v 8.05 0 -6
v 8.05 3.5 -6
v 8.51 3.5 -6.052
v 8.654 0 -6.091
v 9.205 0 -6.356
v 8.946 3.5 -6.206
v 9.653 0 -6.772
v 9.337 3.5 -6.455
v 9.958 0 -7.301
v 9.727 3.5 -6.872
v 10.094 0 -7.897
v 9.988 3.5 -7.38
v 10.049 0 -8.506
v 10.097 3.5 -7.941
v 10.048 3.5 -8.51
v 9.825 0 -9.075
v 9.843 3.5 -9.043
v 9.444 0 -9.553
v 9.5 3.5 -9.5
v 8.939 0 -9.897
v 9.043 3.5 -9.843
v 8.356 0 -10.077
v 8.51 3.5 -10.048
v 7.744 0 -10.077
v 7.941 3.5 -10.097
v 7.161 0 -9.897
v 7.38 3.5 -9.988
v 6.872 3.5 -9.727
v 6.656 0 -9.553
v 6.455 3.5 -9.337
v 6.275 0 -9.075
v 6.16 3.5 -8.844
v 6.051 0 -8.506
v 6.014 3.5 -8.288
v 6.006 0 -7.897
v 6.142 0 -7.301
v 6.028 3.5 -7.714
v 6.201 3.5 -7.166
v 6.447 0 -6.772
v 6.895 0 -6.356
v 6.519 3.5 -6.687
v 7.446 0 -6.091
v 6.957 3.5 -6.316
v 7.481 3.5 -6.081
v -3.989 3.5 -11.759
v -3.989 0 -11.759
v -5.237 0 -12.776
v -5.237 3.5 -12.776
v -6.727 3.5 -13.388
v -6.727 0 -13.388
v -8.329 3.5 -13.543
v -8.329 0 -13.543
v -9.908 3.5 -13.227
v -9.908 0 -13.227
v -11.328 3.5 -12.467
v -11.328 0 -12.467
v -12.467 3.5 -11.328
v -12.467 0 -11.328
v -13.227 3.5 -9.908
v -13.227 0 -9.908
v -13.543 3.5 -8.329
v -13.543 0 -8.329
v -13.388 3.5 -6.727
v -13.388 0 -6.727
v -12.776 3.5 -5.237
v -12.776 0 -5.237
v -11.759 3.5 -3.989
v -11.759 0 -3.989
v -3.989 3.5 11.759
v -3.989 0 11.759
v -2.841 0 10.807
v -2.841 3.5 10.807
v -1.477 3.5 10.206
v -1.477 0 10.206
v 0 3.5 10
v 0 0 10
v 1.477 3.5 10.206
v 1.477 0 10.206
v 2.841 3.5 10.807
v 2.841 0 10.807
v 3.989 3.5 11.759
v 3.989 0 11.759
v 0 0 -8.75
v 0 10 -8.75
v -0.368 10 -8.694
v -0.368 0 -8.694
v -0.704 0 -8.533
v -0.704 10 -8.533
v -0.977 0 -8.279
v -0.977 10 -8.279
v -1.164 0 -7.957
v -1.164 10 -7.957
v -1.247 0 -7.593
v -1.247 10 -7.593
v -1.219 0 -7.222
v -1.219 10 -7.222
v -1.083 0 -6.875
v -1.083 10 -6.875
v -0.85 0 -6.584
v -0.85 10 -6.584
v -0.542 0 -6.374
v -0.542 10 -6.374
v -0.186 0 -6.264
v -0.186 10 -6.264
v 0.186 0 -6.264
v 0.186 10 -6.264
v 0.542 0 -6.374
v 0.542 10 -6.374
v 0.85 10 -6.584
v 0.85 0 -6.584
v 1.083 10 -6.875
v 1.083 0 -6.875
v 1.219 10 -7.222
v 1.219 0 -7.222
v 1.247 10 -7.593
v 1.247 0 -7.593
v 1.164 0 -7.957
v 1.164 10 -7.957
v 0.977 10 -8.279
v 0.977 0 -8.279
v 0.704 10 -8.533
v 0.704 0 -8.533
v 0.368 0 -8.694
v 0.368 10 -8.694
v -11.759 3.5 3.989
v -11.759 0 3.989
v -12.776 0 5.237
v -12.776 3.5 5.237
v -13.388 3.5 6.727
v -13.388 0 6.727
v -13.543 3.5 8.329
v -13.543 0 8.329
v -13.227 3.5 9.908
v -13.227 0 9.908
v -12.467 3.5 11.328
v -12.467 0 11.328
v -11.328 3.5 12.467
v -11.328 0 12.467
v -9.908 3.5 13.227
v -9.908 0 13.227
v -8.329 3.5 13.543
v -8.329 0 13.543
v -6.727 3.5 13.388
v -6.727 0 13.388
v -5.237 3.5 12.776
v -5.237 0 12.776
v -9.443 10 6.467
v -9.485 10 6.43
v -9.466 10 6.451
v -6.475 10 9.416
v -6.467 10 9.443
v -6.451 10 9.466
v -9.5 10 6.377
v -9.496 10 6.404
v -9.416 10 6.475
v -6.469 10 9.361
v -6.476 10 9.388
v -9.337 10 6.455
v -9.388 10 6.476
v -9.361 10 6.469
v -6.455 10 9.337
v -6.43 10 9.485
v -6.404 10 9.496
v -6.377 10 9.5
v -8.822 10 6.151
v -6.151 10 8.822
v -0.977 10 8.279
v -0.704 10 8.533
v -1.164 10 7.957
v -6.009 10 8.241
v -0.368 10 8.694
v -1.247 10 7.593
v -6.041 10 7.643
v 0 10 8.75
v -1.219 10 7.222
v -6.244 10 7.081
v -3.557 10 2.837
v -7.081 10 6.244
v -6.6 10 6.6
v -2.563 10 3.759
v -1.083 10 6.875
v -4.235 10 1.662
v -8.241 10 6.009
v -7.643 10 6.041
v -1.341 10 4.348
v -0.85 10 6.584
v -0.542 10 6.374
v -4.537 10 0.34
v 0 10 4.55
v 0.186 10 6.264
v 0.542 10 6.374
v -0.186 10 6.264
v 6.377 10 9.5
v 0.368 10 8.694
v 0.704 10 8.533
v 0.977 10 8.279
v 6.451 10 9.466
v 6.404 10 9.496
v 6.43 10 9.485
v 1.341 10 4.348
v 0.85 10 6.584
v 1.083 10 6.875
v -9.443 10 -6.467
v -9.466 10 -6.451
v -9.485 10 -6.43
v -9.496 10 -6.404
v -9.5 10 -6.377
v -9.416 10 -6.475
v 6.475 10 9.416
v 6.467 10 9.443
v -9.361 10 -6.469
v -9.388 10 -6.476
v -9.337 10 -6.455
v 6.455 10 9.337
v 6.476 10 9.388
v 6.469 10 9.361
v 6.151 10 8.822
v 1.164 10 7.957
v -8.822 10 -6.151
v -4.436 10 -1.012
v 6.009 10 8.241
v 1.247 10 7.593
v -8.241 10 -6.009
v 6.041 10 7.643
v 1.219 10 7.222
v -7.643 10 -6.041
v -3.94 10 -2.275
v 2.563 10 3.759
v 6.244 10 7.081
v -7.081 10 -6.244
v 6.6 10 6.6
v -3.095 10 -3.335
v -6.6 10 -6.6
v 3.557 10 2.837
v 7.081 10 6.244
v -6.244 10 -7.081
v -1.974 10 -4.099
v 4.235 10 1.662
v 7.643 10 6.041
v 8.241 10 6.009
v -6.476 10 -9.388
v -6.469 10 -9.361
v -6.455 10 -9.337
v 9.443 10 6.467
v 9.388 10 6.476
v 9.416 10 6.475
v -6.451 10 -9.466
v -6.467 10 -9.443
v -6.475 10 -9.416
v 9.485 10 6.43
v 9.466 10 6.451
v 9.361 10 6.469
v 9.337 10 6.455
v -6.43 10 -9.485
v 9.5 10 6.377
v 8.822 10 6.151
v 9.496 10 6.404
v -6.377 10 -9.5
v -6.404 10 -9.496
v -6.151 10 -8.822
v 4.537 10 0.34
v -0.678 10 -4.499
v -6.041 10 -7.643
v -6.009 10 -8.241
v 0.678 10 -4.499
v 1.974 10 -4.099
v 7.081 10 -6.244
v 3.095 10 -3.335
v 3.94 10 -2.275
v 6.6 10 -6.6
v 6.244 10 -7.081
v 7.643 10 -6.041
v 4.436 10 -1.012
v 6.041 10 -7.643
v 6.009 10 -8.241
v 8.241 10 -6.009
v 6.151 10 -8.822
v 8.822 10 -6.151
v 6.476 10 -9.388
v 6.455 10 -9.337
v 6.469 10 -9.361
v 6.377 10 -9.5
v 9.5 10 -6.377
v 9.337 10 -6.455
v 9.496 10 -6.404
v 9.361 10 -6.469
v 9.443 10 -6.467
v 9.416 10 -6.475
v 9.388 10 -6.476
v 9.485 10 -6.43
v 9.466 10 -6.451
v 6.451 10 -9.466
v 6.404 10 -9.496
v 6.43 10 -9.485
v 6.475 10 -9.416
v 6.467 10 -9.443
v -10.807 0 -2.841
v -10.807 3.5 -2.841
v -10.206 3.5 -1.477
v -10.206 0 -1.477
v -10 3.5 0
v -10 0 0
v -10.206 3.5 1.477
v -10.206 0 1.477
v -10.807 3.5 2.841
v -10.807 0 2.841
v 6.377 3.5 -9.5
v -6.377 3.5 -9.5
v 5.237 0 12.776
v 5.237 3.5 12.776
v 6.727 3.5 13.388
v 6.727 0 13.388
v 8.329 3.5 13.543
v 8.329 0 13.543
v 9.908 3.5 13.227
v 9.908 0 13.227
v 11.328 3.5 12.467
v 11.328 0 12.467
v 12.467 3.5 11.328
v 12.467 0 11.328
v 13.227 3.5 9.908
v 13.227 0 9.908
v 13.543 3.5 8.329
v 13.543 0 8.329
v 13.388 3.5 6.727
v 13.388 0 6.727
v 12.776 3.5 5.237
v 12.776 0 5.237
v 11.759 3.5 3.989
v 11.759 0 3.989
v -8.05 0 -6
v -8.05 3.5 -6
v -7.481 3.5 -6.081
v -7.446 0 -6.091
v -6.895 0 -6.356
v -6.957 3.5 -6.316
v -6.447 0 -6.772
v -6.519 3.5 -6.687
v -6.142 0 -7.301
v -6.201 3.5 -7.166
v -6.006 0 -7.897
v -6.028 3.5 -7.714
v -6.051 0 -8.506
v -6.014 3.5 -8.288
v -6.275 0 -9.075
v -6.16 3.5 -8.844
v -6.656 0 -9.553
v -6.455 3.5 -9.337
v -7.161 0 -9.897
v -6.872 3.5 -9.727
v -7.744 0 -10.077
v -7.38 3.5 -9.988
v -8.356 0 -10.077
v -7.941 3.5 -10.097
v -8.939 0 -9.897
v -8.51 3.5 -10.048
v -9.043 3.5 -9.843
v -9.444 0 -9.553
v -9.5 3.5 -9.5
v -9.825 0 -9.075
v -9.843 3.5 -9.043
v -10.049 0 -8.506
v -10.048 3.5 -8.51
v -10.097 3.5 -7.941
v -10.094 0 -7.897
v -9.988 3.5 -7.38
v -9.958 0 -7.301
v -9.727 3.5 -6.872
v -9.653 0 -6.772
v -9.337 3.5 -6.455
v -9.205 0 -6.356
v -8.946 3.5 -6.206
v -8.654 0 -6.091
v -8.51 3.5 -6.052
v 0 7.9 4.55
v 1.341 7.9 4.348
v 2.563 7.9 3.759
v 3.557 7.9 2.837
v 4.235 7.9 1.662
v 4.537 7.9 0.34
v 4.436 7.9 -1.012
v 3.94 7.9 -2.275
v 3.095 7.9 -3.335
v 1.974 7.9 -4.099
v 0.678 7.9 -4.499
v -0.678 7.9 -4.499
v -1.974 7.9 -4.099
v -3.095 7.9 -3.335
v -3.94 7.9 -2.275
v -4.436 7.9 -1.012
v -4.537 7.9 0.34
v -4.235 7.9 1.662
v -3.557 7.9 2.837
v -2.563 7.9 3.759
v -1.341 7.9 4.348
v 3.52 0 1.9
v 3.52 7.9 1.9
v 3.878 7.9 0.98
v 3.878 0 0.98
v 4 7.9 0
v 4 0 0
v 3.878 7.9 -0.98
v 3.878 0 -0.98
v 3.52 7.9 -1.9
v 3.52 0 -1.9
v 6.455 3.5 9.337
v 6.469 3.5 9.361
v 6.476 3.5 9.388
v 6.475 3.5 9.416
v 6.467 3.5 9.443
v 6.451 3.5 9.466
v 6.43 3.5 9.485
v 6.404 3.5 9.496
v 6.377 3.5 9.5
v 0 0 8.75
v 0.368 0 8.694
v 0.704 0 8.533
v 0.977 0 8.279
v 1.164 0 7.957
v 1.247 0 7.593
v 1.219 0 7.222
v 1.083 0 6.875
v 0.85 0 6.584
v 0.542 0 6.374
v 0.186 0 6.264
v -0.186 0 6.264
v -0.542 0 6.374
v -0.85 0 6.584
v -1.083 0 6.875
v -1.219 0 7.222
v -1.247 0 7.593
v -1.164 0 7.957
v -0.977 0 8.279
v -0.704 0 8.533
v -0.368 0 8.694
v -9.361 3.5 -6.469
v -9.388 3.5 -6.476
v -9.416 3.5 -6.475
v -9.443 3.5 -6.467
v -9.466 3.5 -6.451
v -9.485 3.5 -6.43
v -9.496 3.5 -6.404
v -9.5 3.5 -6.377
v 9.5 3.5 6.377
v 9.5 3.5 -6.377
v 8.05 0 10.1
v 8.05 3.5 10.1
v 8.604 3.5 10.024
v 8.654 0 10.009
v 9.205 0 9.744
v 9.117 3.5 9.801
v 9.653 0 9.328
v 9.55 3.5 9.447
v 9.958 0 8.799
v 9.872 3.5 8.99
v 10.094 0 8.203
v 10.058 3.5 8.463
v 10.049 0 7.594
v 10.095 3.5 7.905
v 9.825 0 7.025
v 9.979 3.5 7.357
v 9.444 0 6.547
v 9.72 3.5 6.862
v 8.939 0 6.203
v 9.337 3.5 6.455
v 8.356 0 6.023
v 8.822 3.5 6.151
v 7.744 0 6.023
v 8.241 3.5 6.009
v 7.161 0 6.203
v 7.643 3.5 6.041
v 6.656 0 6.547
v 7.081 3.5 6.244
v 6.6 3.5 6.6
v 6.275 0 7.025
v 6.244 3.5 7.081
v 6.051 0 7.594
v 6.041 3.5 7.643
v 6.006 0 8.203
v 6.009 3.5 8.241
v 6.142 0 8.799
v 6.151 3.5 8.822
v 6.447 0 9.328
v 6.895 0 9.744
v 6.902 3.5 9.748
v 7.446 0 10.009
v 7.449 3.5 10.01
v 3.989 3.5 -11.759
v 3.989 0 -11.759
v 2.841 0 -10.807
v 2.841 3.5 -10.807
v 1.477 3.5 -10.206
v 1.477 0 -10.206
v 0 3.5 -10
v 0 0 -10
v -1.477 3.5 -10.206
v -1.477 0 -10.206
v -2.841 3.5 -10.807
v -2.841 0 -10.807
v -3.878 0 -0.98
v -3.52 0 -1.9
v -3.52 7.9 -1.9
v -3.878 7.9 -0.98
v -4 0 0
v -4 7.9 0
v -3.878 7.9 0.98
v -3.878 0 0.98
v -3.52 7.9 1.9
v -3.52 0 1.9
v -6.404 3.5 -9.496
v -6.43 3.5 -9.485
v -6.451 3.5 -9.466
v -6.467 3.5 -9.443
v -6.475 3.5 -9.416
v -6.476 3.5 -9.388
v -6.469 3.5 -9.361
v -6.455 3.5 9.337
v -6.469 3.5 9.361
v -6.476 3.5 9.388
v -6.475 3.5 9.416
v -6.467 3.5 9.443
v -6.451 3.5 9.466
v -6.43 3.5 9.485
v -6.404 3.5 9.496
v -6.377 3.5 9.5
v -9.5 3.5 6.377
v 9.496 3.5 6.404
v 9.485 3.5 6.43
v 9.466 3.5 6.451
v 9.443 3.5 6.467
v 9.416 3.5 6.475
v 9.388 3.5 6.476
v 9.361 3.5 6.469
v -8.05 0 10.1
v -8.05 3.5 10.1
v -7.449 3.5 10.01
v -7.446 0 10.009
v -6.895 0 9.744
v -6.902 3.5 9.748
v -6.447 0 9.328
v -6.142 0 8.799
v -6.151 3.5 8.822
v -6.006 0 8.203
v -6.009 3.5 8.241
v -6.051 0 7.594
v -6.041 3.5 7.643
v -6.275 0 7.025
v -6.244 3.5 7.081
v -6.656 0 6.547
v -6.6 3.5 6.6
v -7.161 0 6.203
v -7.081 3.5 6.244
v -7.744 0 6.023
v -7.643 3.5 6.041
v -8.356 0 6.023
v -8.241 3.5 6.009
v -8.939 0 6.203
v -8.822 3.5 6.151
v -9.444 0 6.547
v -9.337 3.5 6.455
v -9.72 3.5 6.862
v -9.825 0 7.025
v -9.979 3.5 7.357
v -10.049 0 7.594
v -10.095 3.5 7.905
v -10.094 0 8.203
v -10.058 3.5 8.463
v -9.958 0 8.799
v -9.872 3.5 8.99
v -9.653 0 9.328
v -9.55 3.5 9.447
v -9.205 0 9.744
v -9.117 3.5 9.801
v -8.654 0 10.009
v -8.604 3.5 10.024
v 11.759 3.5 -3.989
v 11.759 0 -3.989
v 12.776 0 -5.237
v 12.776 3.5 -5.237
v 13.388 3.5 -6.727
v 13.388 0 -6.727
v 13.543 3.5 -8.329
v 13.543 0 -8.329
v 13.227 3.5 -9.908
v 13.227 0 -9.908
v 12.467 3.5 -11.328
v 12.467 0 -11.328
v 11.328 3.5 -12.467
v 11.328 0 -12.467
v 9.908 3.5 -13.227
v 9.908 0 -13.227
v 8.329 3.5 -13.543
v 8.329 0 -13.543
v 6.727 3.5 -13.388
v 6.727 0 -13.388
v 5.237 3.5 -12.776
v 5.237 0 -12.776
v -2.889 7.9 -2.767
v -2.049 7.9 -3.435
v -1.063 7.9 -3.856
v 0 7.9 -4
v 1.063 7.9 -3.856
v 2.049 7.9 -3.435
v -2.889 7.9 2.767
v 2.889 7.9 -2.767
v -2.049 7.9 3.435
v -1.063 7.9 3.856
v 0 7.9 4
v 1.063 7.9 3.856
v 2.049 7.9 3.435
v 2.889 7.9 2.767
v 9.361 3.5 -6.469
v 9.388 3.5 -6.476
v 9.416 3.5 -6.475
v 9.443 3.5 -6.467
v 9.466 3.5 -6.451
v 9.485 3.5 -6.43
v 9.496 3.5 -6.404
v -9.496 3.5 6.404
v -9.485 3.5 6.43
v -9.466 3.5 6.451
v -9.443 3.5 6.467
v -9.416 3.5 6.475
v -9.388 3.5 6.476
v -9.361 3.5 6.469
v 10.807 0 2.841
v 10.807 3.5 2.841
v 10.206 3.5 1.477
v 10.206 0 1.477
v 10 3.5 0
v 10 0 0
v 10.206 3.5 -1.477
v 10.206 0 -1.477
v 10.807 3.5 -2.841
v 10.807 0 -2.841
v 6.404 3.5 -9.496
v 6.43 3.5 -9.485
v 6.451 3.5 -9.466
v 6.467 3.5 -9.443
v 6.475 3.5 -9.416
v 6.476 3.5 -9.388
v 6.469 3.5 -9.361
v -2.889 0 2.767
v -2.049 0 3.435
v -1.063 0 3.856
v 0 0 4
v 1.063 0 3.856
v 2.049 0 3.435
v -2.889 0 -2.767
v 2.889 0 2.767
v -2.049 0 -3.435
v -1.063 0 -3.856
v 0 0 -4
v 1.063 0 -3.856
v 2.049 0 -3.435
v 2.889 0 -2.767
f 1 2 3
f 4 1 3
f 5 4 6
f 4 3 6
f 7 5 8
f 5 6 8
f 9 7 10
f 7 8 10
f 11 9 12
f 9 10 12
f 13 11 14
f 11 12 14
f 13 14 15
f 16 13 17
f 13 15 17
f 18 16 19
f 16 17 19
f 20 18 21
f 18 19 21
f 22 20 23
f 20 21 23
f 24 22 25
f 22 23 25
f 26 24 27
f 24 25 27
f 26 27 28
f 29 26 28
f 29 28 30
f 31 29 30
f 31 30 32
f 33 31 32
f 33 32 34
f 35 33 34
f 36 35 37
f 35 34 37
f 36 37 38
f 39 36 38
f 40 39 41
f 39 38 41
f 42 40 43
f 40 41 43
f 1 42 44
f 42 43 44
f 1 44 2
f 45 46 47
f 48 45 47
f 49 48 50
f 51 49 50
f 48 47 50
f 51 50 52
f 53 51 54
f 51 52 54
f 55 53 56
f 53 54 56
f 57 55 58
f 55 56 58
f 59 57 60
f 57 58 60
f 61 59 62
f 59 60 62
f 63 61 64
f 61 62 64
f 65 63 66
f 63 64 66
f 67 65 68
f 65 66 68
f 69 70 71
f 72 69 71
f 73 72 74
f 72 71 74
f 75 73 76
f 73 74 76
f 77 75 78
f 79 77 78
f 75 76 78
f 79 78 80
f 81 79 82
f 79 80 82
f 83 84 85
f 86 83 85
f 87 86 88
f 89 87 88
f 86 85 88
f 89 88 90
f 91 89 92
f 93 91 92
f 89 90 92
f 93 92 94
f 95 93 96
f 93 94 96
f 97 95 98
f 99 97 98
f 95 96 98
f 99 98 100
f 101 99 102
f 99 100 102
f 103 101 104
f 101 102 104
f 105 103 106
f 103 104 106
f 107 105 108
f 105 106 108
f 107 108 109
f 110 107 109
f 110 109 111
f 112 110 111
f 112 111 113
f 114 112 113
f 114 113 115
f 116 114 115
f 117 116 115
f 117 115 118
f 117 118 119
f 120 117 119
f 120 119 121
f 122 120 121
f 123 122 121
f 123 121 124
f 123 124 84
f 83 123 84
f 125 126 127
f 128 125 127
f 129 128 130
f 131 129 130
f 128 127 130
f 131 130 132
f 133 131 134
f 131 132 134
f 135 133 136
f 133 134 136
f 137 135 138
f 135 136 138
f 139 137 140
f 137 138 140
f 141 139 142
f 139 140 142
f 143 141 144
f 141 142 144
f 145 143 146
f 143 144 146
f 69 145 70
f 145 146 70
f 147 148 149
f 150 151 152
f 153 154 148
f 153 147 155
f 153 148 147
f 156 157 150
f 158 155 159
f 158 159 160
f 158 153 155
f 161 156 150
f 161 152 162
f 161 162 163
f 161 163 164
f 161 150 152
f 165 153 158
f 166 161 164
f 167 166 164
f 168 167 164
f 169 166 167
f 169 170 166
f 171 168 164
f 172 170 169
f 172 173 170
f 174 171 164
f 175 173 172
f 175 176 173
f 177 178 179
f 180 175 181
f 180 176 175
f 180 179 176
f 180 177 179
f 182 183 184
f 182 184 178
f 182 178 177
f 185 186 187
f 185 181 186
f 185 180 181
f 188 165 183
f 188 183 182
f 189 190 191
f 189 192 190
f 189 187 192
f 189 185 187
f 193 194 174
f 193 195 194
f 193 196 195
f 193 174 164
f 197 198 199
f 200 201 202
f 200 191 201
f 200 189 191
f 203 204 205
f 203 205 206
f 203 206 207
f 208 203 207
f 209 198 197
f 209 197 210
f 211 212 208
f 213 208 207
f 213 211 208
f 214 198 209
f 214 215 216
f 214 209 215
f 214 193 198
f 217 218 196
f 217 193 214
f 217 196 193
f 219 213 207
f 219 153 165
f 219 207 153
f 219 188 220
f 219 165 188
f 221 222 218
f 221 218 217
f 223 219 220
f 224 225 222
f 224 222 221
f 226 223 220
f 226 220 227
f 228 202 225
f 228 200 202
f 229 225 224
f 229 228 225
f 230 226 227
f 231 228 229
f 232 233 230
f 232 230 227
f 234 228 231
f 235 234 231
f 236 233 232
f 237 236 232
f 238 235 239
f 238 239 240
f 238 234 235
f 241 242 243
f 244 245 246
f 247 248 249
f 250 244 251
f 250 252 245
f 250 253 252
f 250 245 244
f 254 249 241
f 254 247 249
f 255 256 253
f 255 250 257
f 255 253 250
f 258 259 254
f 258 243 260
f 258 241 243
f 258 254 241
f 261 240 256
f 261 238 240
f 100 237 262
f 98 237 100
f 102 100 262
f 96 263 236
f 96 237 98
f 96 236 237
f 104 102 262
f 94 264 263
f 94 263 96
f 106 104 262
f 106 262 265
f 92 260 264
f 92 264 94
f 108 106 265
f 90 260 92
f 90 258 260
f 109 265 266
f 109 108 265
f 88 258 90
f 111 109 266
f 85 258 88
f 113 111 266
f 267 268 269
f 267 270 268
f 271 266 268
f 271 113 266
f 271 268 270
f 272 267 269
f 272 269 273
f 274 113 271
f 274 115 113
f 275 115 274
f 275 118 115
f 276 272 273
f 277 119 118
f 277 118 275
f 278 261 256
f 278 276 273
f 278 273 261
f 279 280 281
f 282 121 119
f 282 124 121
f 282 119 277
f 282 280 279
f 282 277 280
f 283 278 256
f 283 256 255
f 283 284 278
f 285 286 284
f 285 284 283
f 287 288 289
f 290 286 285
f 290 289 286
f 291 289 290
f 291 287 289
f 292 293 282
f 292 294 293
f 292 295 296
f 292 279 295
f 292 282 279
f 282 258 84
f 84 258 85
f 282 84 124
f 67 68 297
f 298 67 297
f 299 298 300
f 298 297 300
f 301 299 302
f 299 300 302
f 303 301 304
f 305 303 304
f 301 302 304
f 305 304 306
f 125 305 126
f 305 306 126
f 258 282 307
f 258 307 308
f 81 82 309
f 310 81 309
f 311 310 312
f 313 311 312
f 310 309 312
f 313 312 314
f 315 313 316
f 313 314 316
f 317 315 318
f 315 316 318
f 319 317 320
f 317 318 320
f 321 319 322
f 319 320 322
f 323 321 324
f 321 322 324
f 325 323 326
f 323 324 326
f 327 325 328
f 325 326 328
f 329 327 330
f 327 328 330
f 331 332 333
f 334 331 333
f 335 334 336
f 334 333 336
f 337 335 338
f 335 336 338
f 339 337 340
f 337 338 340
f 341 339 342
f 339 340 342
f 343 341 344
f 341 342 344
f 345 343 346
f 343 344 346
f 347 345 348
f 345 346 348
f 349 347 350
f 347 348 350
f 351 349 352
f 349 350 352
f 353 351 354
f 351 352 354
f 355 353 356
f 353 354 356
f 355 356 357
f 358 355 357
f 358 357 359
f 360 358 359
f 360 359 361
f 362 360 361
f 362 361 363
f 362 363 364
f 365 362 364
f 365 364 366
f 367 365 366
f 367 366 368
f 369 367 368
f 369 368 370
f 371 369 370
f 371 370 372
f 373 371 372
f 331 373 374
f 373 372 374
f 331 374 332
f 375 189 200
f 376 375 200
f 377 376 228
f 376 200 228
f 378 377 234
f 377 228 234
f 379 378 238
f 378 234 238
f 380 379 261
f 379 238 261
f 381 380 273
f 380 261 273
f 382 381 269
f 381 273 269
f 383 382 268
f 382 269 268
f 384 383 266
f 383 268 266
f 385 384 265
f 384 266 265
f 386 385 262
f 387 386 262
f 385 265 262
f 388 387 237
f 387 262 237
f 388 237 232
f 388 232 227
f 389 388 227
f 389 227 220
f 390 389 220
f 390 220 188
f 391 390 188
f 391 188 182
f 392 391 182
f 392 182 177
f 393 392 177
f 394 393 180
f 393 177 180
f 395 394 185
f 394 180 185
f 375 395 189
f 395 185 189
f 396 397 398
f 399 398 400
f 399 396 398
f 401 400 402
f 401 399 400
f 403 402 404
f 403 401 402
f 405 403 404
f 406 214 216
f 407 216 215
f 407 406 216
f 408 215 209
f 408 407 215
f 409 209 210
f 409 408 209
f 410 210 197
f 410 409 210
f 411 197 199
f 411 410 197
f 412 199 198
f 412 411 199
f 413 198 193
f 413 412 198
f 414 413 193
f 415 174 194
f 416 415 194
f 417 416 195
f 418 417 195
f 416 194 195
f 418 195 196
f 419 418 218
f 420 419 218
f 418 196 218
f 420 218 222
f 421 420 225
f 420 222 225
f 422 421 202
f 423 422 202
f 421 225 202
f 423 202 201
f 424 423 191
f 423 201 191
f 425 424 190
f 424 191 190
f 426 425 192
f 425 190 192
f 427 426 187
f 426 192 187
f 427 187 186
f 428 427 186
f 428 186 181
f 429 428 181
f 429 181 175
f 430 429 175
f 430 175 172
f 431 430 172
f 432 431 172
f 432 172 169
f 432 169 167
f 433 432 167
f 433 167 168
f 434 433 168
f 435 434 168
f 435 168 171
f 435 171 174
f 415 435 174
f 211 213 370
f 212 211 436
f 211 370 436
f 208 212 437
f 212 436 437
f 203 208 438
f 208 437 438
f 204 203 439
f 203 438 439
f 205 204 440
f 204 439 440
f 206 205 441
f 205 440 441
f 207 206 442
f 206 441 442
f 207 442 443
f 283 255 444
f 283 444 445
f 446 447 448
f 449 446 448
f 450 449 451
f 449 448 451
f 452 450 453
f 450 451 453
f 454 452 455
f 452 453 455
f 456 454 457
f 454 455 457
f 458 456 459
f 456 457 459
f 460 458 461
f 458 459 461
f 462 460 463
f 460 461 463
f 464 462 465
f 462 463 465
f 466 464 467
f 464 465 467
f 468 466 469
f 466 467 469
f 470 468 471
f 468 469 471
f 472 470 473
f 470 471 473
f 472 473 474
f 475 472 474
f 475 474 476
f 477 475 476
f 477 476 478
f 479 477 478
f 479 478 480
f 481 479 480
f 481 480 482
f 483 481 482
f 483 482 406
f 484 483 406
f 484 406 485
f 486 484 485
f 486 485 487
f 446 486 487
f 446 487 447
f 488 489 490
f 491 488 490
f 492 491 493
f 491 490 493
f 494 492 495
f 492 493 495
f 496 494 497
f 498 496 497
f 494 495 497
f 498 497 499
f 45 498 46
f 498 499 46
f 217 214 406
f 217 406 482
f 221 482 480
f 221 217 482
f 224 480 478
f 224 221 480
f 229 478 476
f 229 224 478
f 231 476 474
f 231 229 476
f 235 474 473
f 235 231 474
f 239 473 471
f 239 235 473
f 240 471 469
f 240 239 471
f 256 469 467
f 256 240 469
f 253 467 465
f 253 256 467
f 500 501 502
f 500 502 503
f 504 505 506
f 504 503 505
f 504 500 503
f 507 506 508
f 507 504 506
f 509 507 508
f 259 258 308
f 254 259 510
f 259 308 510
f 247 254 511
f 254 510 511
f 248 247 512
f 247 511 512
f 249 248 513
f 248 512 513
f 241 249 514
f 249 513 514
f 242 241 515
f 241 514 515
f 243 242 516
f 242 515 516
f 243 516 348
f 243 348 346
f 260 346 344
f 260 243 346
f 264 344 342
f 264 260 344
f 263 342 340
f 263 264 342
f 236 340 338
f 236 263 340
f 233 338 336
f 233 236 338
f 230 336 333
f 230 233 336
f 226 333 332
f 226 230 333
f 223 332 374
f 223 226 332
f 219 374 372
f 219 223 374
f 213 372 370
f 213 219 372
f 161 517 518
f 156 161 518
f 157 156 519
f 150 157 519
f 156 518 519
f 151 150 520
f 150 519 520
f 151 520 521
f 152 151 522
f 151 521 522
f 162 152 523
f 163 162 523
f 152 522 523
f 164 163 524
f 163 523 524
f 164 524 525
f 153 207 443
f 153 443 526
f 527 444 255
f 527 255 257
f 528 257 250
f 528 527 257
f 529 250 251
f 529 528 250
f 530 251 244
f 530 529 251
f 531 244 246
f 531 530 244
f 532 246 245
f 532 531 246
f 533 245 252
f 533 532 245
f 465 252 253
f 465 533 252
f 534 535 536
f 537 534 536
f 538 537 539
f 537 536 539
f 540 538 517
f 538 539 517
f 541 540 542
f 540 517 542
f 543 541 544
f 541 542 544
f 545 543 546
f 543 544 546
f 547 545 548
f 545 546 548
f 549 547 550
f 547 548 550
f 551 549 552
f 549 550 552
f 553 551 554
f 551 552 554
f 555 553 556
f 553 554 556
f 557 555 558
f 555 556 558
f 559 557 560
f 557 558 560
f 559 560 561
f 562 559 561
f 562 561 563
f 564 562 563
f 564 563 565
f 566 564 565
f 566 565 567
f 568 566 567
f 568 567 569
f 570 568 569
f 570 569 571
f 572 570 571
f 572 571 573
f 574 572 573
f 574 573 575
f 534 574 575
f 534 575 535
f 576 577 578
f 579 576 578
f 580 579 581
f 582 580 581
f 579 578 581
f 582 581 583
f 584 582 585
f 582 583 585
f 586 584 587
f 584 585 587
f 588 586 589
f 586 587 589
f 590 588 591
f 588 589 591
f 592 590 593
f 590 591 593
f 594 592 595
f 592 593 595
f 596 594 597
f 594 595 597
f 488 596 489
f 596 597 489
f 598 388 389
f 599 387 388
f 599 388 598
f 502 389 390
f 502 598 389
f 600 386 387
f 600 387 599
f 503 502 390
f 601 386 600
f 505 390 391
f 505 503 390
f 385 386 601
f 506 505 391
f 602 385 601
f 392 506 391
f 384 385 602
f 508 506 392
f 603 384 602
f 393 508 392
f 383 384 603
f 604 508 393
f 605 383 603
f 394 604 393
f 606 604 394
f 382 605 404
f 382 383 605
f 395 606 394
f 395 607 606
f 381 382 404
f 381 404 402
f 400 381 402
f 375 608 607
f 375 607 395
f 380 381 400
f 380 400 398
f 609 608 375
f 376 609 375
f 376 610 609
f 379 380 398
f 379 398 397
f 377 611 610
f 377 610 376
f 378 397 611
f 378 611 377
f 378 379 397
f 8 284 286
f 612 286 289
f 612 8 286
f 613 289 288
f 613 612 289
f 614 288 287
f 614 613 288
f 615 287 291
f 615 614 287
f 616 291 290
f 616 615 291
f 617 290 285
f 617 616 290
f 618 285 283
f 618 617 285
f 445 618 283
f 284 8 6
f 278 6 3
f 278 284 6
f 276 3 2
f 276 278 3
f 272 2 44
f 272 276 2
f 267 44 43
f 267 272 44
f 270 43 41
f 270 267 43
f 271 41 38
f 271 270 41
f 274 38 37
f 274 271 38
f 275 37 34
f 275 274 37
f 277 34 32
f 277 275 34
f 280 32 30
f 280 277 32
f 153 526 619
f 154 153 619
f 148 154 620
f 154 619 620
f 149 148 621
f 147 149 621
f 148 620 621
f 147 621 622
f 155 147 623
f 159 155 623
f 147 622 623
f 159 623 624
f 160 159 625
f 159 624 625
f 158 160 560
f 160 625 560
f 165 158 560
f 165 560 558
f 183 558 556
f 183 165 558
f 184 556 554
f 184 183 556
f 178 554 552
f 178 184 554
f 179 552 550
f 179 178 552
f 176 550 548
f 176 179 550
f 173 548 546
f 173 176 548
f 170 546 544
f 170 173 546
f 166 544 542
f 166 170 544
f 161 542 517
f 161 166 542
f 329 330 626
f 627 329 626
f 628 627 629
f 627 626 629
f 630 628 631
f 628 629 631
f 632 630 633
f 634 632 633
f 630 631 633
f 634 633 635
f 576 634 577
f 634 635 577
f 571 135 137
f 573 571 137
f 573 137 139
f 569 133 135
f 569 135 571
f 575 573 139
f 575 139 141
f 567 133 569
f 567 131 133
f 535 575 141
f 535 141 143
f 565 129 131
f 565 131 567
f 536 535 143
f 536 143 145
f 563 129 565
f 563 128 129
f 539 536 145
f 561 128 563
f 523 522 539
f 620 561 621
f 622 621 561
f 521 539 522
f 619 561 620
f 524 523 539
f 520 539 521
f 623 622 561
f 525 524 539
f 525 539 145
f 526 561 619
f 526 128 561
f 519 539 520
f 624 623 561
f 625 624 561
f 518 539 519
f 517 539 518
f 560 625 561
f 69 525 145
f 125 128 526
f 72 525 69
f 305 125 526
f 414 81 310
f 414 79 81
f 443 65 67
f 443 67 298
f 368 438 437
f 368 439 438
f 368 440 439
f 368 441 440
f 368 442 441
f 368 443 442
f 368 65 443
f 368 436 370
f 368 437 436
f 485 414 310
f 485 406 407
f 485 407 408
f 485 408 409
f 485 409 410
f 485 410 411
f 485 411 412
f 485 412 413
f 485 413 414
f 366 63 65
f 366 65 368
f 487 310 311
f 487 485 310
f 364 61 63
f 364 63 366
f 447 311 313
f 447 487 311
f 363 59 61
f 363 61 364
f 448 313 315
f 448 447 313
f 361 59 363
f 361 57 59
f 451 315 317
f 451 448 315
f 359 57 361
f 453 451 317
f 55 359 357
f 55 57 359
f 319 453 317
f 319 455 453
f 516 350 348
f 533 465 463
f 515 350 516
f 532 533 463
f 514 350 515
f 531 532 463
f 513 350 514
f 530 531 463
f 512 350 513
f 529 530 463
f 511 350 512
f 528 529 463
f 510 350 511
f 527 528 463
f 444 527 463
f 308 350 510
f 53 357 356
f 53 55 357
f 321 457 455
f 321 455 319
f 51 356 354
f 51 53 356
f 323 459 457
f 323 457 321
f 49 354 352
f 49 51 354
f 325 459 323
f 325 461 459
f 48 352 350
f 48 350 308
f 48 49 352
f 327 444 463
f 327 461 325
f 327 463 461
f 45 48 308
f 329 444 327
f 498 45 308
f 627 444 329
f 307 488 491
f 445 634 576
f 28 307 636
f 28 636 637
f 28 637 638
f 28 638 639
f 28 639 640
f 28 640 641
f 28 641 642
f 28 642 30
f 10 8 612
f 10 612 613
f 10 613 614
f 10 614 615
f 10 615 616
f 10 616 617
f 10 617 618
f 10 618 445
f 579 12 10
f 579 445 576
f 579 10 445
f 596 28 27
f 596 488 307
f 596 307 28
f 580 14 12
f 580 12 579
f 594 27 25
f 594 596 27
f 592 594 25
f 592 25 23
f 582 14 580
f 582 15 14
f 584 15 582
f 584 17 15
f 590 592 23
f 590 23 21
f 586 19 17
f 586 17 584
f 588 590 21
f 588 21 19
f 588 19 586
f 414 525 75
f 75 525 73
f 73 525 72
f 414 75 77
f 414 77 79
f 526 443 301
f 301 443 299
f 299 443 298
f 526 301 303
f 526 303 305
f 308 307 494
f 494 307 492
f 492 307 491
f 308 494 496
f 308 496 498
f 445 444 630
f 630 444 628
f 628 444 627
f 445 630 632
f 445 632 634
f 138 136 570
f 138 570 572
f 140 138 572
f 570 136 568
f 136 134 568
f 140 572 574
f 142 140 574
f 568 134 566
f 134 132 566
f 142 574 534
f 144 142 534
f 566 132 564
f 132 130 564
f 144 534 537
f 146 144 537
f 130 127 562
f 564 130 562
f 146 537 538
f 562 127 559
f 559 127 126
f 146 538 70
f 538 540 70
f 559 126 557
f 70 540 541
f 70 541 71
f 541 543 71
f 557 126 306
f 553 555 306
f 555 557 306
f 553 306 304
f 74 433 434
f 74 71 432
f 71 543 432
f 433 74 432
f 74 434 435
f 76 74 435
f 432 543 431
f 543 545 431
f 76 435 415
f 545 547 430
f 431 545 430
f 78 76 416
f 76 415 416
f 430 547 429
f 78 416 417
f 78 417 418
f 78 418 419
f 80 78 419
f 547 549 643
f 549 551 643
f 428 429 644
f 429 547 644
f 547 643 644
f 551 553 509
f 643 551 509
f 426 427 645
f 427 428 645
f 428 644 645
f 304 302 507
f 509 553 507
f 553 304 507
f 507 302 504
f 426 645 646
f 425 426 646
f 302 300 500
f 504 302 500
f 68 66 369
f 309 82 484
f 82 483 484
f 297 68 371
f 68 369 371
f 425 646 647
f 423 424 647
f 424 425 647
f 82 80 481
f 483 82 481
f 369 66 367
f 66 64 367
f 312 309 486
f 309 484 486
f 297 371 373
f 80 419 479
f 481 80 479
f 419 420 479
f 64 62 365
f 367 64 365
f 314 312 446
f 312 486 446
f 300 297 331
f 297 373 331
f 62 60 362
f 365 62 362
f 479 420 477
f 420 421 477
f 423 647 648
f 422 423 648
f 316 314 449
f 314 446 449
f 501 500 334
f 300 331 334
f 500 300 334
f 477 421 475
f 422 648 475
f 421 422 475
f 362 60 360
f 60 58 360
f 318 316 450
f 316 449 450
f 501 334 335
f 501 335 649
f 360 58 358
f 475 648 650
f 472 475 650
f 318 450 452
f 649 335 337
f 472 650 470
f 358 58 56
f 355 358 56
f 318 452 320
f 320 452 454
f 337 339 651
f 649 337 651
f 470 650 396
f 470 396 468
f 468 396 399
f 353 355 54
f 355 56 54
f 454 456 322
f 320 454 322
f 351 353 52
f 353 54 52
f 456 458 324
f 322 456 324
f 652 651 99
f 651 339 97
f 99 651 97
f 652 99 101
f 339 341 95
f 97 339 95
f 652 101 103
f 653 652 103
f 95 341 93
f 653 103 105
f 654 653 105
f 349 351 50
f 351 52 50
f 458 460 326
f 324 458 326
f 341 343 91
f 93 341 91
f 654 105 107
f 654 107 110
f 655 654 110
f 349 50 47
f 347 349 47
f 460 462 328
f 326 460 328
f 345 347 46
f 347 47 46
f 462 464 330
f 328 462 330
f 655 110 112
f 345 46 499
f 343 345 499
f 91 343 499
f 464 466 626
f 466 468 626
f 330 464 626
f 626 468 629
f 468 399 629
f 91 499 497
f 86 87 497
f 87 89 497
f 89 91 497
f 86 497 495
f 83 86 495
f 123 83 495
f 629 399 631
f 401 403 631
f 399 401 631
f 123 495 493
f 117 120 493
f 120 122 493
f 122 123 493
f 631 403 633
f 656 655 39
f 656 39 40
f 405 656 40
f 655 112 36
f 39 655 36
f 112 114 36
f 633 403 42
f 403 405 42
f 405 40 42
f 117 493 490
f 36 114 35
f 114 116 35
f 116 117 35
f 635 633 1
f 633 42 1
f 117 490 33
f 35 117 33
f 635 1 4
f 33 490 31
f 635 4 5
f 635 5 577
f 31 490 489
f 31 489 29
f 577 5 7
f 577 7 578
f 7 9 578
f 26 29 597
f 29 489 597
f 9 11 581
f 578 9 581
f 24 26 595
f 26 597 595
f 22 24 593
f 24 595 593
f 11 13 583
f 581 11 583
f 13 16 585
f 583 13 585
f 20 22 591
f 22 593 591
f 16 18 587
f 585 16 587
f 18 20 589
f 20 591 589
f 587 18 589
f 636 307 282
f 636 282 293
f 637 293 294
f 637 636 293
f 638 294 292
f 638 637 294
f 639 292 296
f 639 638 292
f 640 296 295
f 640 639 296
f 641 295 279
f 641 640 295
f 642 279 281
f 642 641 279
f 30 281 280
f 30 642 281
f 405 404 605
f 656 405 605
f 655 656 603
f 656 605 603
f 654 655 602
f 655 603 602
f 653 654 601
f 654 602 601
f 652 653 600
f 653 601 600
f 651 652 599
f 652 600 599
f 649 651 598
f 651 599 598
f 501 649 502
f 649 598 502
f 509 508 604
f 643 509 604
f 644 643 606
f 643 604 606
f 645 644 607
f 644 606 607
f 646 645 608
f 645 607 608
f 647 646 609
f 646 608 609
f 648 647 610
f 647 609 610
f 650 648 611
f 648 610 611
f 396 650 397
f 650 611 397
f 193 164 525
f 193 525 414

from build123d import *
from build123d.topology import SkipClean

# Parameters (mm, degrees)
SKETCH1_R               = 1.25
BOSS_EXTRUDE1_DEPTH     = 3.5
SKETCH3_R               = 2.05
CUT_EXTRUDE3_DEPTH      = 20.479604719
BOSS_EXTRUDE2_START     = 6.5
SKETCH6_R               = 1.25
BOSS_EXTRUDE2_DEPTH     = 6.5
CUT_EXTRUDE8_DEPTH      = 22.614925399
CUT_EXTRUDE7_DEPTH      = 22.614925399
CUT_EXTRUDE7_DEPTH_BACK = 22.614925399
SKETCH9_R               = 4
SKETCH11_R              = 4.55
CUT_EXTRUDE9_DEPTH      = 2.1
FILLET5_R               = 0.1


with BuildPart() as part:
    # Sketch1 → Boss-Extrude1 (new body)
    with BuildSketch(Plane(origin=(0, 0, 0), x_dir=(1, 0, 0), z_dir=(0, 1, 0))):
        with BuildLine():
            ThreePointArc((3.988860539, -11.759062722), (11.939087297, -11.939087297), (11.759062722, -3.988860539))
            ThreePointArc((11.759062722, -3.988860539), (10, 0), (11.759062722, 3.988860539))
            ThreePointArc((11.759062722, 3.988860539), (11.939087297, 11.939087297), (3.988860539, 11.759062722))
            ThreePointArc((3.988860539, 11.759062722), (0, 10), (-3.988860539, 11.759062722))
            ThreePointArc((-3.988860539, 11.759062722), (-11.939087297, 11.939087297), (-11.759062722, 3.988860539))
            ThreePointArc((-11.759062722, 3.988860539), (-10, 0), (-11.759062722, -3.988860539))
            ThreePointArc((-11.759062722, -3.988860539), (-11.939087297, -11.939087297), (-3.988860539, -11.759062722))
            ThreePointArc((-3.988860539, -11.759062722), (0, -10), (3.988860539, -11.759062722))
        make_face()
        with Locations(Location((0, -7.5, 0), (0, 0, 270))):
            Circle(SKETCH1_R, mode=Mode.SUBTRACT)
        with Locations(Location((0, 7.5, 0), (0, 0, 90))):
            Circle(SKETCH1_R, mode=Mode.SUBTRACT)
    extrude(amount=BOSS_EXTRUDE1_DEPTH)

    # Sketch3 → Cut-Extrude3 (cut, through all)
    with BuildSketch(Plane(origin=(0, 3.5, 0), x_dir=(1, 0, 0), z_dir=(0, 1, 0))):
        with Locations(Location((-8.05, 8.05, 0), (0, 0, 270))):
            Circle(SKETCH3_R)
        with Locations(Location((8.05, 8.05, 0), (0, 0, 270))):
            Circle(SKETCH3_R)
        with Locations(Location((8.05, -8.05, 0), (0, 0, 270))):
            Circle(SKETCH3_R)
        with Locations(Location((-8.05, -8.05, 0), (0, 0, 270))):
            Circle(SKETCH3_R)
    extrude(amount=-CUT_EXTRUDE3_DEPTH, mode=Mode.SUBTRACT)

    # Sketch6 → Boss-Extrude2 (add)
    with SkipClean():  # the faces are left unmerged after this step: merging them gives an invalid solid
        with BuildSketch(Plane(origin=(0, 3.5, 0), x_dir=(1, 0, 0), z_dir=(0, 1, 0)).offset(BOSS_EXTRUDE2_START)):
            with BuildLine():
                Line((6.600862325, 9.5), (-6.600862325, 9.5))
                ThreePointArc((-6.600862325, 9.5), (-6.600431099, 6.600431099), (-9.5, 6.600862325))
                Line((-9.5, 6.600862325), (-9.5, -6.600862325))
                ThreePointArc((-9.5, -6.600862325), (-6.600431099, -6.600431099), (-6.600862325, -9.5))
                Line((-6.600862325, -9.5), (6.600862325, -9.5))
                ThreePointArc((6.600862325, -9.5), (6.600431099, -6.600431099), (9.5, -6.600862325))
                Line((9.5, -6.600862325), (9.5, 6.600862325))
                ThreePointArc((9.5, 6.600862325), (6.600431099, 6.600431099), (6.600862325, 9.5))
            make_face()
            with Locations(Location((0, -7.5, 0), (0, 0, 270))):
                Circle(SKETCH6_R, mode=Mode.SUBTRACT)
            with Locations(Location((0, 7.5, 0), (0, 0, 90))):
                Circle(SKETCH6_R, mode=Mode.SUBTRACT)
        extrude(amount=-BOSS_EXTRUDE2_DEPTH)

    # Sketch10 → Cut-Extrude8 (cut, through all)
    with SkipClean():  # the faces are left unmerged after this step: merging them gives an invalid solid
        with BuildSketch(Plane(origin=(0, 10, 0), x_dir=(1, 0, 0), z_dir=(0, 1, 0))):
            with BuildLine():
                Line((-3.519943181, 1.9), (-3.519943181, -1.9))
                ThreePointArc((-3.519943181, -1.9), (0, -4), (3.519943181, -1.9))
                Line((3.519943181, -1.9), (3.519943181, 1.9))
                ThreePointArc((3.519943181, 1.9), (0, 4), (-3.519943181, 1.9))
            make_face()
        extrude(amount=-CUT_EXTRUDE8_DEPTH, mode=Mode.SUBTRACT)

    # Sketch9 → Cut-Extrude7 (cut, two sides: drawn at the far end of the back side and taken through both)
    with SkipClean():  # the faces are left unmerged after this step: merging them gives an invalid solid
        with BuildSketch(Plane(origin=(0, 10, 0), x_dir=(1, 0, 0), z_dir=(0, 1, 0)).offset(-CUT_EXTRUDE7_DEPTH_BACK)):
            with Locations(Location((0, 0, 0), (0, 0, 90))):
                Circle(SKETCH9_R)
        extrude(amount=CUT_EXTRUDE7_DEPTH + CUT_EXTRUDE7_DEPTH_BACK, mode=Mode.SUBTRACT)

    # Sketch11 → Cut-Extrude9 (cut)
    with SkipClean():  # the faces are left unmerged after this step: merging them gives an invalid solid
        with BuildSketch(Plane(origin=(0, 10, 0), x_dir=(1, 0, 0), z_dir=(0, 1, 0))):
            with Locations(Location((0, 0, 0), (0, 0, 270))):
                Circle(SKETCH11_R)
        extrude(amount=-CUT_EXTRUDE9_DEPTH, mode=Mode.SUBTRACT)

    # Fillet5
    fillet5_edges = [part.edges().sort_by_distance(p)[0] for p in [
        (9.5, 6.75, -6.600862325),
        (6.600862325, 6.75, -9.5),
        (9.5, 6.75, 6.600862325),
        (6.600862325, 6.75, 9.5),
        (-6.600862325, 6.75, 9.5),
        (-9.5, 6.75, 6.600862325),
        (-9.5, 6.75, -6.600862325),
        (-6.600862325, 6.75, -9.5),
    ]]
    fillet(fillet5_edges, radius=FILLET5_R)


solid = part.part
